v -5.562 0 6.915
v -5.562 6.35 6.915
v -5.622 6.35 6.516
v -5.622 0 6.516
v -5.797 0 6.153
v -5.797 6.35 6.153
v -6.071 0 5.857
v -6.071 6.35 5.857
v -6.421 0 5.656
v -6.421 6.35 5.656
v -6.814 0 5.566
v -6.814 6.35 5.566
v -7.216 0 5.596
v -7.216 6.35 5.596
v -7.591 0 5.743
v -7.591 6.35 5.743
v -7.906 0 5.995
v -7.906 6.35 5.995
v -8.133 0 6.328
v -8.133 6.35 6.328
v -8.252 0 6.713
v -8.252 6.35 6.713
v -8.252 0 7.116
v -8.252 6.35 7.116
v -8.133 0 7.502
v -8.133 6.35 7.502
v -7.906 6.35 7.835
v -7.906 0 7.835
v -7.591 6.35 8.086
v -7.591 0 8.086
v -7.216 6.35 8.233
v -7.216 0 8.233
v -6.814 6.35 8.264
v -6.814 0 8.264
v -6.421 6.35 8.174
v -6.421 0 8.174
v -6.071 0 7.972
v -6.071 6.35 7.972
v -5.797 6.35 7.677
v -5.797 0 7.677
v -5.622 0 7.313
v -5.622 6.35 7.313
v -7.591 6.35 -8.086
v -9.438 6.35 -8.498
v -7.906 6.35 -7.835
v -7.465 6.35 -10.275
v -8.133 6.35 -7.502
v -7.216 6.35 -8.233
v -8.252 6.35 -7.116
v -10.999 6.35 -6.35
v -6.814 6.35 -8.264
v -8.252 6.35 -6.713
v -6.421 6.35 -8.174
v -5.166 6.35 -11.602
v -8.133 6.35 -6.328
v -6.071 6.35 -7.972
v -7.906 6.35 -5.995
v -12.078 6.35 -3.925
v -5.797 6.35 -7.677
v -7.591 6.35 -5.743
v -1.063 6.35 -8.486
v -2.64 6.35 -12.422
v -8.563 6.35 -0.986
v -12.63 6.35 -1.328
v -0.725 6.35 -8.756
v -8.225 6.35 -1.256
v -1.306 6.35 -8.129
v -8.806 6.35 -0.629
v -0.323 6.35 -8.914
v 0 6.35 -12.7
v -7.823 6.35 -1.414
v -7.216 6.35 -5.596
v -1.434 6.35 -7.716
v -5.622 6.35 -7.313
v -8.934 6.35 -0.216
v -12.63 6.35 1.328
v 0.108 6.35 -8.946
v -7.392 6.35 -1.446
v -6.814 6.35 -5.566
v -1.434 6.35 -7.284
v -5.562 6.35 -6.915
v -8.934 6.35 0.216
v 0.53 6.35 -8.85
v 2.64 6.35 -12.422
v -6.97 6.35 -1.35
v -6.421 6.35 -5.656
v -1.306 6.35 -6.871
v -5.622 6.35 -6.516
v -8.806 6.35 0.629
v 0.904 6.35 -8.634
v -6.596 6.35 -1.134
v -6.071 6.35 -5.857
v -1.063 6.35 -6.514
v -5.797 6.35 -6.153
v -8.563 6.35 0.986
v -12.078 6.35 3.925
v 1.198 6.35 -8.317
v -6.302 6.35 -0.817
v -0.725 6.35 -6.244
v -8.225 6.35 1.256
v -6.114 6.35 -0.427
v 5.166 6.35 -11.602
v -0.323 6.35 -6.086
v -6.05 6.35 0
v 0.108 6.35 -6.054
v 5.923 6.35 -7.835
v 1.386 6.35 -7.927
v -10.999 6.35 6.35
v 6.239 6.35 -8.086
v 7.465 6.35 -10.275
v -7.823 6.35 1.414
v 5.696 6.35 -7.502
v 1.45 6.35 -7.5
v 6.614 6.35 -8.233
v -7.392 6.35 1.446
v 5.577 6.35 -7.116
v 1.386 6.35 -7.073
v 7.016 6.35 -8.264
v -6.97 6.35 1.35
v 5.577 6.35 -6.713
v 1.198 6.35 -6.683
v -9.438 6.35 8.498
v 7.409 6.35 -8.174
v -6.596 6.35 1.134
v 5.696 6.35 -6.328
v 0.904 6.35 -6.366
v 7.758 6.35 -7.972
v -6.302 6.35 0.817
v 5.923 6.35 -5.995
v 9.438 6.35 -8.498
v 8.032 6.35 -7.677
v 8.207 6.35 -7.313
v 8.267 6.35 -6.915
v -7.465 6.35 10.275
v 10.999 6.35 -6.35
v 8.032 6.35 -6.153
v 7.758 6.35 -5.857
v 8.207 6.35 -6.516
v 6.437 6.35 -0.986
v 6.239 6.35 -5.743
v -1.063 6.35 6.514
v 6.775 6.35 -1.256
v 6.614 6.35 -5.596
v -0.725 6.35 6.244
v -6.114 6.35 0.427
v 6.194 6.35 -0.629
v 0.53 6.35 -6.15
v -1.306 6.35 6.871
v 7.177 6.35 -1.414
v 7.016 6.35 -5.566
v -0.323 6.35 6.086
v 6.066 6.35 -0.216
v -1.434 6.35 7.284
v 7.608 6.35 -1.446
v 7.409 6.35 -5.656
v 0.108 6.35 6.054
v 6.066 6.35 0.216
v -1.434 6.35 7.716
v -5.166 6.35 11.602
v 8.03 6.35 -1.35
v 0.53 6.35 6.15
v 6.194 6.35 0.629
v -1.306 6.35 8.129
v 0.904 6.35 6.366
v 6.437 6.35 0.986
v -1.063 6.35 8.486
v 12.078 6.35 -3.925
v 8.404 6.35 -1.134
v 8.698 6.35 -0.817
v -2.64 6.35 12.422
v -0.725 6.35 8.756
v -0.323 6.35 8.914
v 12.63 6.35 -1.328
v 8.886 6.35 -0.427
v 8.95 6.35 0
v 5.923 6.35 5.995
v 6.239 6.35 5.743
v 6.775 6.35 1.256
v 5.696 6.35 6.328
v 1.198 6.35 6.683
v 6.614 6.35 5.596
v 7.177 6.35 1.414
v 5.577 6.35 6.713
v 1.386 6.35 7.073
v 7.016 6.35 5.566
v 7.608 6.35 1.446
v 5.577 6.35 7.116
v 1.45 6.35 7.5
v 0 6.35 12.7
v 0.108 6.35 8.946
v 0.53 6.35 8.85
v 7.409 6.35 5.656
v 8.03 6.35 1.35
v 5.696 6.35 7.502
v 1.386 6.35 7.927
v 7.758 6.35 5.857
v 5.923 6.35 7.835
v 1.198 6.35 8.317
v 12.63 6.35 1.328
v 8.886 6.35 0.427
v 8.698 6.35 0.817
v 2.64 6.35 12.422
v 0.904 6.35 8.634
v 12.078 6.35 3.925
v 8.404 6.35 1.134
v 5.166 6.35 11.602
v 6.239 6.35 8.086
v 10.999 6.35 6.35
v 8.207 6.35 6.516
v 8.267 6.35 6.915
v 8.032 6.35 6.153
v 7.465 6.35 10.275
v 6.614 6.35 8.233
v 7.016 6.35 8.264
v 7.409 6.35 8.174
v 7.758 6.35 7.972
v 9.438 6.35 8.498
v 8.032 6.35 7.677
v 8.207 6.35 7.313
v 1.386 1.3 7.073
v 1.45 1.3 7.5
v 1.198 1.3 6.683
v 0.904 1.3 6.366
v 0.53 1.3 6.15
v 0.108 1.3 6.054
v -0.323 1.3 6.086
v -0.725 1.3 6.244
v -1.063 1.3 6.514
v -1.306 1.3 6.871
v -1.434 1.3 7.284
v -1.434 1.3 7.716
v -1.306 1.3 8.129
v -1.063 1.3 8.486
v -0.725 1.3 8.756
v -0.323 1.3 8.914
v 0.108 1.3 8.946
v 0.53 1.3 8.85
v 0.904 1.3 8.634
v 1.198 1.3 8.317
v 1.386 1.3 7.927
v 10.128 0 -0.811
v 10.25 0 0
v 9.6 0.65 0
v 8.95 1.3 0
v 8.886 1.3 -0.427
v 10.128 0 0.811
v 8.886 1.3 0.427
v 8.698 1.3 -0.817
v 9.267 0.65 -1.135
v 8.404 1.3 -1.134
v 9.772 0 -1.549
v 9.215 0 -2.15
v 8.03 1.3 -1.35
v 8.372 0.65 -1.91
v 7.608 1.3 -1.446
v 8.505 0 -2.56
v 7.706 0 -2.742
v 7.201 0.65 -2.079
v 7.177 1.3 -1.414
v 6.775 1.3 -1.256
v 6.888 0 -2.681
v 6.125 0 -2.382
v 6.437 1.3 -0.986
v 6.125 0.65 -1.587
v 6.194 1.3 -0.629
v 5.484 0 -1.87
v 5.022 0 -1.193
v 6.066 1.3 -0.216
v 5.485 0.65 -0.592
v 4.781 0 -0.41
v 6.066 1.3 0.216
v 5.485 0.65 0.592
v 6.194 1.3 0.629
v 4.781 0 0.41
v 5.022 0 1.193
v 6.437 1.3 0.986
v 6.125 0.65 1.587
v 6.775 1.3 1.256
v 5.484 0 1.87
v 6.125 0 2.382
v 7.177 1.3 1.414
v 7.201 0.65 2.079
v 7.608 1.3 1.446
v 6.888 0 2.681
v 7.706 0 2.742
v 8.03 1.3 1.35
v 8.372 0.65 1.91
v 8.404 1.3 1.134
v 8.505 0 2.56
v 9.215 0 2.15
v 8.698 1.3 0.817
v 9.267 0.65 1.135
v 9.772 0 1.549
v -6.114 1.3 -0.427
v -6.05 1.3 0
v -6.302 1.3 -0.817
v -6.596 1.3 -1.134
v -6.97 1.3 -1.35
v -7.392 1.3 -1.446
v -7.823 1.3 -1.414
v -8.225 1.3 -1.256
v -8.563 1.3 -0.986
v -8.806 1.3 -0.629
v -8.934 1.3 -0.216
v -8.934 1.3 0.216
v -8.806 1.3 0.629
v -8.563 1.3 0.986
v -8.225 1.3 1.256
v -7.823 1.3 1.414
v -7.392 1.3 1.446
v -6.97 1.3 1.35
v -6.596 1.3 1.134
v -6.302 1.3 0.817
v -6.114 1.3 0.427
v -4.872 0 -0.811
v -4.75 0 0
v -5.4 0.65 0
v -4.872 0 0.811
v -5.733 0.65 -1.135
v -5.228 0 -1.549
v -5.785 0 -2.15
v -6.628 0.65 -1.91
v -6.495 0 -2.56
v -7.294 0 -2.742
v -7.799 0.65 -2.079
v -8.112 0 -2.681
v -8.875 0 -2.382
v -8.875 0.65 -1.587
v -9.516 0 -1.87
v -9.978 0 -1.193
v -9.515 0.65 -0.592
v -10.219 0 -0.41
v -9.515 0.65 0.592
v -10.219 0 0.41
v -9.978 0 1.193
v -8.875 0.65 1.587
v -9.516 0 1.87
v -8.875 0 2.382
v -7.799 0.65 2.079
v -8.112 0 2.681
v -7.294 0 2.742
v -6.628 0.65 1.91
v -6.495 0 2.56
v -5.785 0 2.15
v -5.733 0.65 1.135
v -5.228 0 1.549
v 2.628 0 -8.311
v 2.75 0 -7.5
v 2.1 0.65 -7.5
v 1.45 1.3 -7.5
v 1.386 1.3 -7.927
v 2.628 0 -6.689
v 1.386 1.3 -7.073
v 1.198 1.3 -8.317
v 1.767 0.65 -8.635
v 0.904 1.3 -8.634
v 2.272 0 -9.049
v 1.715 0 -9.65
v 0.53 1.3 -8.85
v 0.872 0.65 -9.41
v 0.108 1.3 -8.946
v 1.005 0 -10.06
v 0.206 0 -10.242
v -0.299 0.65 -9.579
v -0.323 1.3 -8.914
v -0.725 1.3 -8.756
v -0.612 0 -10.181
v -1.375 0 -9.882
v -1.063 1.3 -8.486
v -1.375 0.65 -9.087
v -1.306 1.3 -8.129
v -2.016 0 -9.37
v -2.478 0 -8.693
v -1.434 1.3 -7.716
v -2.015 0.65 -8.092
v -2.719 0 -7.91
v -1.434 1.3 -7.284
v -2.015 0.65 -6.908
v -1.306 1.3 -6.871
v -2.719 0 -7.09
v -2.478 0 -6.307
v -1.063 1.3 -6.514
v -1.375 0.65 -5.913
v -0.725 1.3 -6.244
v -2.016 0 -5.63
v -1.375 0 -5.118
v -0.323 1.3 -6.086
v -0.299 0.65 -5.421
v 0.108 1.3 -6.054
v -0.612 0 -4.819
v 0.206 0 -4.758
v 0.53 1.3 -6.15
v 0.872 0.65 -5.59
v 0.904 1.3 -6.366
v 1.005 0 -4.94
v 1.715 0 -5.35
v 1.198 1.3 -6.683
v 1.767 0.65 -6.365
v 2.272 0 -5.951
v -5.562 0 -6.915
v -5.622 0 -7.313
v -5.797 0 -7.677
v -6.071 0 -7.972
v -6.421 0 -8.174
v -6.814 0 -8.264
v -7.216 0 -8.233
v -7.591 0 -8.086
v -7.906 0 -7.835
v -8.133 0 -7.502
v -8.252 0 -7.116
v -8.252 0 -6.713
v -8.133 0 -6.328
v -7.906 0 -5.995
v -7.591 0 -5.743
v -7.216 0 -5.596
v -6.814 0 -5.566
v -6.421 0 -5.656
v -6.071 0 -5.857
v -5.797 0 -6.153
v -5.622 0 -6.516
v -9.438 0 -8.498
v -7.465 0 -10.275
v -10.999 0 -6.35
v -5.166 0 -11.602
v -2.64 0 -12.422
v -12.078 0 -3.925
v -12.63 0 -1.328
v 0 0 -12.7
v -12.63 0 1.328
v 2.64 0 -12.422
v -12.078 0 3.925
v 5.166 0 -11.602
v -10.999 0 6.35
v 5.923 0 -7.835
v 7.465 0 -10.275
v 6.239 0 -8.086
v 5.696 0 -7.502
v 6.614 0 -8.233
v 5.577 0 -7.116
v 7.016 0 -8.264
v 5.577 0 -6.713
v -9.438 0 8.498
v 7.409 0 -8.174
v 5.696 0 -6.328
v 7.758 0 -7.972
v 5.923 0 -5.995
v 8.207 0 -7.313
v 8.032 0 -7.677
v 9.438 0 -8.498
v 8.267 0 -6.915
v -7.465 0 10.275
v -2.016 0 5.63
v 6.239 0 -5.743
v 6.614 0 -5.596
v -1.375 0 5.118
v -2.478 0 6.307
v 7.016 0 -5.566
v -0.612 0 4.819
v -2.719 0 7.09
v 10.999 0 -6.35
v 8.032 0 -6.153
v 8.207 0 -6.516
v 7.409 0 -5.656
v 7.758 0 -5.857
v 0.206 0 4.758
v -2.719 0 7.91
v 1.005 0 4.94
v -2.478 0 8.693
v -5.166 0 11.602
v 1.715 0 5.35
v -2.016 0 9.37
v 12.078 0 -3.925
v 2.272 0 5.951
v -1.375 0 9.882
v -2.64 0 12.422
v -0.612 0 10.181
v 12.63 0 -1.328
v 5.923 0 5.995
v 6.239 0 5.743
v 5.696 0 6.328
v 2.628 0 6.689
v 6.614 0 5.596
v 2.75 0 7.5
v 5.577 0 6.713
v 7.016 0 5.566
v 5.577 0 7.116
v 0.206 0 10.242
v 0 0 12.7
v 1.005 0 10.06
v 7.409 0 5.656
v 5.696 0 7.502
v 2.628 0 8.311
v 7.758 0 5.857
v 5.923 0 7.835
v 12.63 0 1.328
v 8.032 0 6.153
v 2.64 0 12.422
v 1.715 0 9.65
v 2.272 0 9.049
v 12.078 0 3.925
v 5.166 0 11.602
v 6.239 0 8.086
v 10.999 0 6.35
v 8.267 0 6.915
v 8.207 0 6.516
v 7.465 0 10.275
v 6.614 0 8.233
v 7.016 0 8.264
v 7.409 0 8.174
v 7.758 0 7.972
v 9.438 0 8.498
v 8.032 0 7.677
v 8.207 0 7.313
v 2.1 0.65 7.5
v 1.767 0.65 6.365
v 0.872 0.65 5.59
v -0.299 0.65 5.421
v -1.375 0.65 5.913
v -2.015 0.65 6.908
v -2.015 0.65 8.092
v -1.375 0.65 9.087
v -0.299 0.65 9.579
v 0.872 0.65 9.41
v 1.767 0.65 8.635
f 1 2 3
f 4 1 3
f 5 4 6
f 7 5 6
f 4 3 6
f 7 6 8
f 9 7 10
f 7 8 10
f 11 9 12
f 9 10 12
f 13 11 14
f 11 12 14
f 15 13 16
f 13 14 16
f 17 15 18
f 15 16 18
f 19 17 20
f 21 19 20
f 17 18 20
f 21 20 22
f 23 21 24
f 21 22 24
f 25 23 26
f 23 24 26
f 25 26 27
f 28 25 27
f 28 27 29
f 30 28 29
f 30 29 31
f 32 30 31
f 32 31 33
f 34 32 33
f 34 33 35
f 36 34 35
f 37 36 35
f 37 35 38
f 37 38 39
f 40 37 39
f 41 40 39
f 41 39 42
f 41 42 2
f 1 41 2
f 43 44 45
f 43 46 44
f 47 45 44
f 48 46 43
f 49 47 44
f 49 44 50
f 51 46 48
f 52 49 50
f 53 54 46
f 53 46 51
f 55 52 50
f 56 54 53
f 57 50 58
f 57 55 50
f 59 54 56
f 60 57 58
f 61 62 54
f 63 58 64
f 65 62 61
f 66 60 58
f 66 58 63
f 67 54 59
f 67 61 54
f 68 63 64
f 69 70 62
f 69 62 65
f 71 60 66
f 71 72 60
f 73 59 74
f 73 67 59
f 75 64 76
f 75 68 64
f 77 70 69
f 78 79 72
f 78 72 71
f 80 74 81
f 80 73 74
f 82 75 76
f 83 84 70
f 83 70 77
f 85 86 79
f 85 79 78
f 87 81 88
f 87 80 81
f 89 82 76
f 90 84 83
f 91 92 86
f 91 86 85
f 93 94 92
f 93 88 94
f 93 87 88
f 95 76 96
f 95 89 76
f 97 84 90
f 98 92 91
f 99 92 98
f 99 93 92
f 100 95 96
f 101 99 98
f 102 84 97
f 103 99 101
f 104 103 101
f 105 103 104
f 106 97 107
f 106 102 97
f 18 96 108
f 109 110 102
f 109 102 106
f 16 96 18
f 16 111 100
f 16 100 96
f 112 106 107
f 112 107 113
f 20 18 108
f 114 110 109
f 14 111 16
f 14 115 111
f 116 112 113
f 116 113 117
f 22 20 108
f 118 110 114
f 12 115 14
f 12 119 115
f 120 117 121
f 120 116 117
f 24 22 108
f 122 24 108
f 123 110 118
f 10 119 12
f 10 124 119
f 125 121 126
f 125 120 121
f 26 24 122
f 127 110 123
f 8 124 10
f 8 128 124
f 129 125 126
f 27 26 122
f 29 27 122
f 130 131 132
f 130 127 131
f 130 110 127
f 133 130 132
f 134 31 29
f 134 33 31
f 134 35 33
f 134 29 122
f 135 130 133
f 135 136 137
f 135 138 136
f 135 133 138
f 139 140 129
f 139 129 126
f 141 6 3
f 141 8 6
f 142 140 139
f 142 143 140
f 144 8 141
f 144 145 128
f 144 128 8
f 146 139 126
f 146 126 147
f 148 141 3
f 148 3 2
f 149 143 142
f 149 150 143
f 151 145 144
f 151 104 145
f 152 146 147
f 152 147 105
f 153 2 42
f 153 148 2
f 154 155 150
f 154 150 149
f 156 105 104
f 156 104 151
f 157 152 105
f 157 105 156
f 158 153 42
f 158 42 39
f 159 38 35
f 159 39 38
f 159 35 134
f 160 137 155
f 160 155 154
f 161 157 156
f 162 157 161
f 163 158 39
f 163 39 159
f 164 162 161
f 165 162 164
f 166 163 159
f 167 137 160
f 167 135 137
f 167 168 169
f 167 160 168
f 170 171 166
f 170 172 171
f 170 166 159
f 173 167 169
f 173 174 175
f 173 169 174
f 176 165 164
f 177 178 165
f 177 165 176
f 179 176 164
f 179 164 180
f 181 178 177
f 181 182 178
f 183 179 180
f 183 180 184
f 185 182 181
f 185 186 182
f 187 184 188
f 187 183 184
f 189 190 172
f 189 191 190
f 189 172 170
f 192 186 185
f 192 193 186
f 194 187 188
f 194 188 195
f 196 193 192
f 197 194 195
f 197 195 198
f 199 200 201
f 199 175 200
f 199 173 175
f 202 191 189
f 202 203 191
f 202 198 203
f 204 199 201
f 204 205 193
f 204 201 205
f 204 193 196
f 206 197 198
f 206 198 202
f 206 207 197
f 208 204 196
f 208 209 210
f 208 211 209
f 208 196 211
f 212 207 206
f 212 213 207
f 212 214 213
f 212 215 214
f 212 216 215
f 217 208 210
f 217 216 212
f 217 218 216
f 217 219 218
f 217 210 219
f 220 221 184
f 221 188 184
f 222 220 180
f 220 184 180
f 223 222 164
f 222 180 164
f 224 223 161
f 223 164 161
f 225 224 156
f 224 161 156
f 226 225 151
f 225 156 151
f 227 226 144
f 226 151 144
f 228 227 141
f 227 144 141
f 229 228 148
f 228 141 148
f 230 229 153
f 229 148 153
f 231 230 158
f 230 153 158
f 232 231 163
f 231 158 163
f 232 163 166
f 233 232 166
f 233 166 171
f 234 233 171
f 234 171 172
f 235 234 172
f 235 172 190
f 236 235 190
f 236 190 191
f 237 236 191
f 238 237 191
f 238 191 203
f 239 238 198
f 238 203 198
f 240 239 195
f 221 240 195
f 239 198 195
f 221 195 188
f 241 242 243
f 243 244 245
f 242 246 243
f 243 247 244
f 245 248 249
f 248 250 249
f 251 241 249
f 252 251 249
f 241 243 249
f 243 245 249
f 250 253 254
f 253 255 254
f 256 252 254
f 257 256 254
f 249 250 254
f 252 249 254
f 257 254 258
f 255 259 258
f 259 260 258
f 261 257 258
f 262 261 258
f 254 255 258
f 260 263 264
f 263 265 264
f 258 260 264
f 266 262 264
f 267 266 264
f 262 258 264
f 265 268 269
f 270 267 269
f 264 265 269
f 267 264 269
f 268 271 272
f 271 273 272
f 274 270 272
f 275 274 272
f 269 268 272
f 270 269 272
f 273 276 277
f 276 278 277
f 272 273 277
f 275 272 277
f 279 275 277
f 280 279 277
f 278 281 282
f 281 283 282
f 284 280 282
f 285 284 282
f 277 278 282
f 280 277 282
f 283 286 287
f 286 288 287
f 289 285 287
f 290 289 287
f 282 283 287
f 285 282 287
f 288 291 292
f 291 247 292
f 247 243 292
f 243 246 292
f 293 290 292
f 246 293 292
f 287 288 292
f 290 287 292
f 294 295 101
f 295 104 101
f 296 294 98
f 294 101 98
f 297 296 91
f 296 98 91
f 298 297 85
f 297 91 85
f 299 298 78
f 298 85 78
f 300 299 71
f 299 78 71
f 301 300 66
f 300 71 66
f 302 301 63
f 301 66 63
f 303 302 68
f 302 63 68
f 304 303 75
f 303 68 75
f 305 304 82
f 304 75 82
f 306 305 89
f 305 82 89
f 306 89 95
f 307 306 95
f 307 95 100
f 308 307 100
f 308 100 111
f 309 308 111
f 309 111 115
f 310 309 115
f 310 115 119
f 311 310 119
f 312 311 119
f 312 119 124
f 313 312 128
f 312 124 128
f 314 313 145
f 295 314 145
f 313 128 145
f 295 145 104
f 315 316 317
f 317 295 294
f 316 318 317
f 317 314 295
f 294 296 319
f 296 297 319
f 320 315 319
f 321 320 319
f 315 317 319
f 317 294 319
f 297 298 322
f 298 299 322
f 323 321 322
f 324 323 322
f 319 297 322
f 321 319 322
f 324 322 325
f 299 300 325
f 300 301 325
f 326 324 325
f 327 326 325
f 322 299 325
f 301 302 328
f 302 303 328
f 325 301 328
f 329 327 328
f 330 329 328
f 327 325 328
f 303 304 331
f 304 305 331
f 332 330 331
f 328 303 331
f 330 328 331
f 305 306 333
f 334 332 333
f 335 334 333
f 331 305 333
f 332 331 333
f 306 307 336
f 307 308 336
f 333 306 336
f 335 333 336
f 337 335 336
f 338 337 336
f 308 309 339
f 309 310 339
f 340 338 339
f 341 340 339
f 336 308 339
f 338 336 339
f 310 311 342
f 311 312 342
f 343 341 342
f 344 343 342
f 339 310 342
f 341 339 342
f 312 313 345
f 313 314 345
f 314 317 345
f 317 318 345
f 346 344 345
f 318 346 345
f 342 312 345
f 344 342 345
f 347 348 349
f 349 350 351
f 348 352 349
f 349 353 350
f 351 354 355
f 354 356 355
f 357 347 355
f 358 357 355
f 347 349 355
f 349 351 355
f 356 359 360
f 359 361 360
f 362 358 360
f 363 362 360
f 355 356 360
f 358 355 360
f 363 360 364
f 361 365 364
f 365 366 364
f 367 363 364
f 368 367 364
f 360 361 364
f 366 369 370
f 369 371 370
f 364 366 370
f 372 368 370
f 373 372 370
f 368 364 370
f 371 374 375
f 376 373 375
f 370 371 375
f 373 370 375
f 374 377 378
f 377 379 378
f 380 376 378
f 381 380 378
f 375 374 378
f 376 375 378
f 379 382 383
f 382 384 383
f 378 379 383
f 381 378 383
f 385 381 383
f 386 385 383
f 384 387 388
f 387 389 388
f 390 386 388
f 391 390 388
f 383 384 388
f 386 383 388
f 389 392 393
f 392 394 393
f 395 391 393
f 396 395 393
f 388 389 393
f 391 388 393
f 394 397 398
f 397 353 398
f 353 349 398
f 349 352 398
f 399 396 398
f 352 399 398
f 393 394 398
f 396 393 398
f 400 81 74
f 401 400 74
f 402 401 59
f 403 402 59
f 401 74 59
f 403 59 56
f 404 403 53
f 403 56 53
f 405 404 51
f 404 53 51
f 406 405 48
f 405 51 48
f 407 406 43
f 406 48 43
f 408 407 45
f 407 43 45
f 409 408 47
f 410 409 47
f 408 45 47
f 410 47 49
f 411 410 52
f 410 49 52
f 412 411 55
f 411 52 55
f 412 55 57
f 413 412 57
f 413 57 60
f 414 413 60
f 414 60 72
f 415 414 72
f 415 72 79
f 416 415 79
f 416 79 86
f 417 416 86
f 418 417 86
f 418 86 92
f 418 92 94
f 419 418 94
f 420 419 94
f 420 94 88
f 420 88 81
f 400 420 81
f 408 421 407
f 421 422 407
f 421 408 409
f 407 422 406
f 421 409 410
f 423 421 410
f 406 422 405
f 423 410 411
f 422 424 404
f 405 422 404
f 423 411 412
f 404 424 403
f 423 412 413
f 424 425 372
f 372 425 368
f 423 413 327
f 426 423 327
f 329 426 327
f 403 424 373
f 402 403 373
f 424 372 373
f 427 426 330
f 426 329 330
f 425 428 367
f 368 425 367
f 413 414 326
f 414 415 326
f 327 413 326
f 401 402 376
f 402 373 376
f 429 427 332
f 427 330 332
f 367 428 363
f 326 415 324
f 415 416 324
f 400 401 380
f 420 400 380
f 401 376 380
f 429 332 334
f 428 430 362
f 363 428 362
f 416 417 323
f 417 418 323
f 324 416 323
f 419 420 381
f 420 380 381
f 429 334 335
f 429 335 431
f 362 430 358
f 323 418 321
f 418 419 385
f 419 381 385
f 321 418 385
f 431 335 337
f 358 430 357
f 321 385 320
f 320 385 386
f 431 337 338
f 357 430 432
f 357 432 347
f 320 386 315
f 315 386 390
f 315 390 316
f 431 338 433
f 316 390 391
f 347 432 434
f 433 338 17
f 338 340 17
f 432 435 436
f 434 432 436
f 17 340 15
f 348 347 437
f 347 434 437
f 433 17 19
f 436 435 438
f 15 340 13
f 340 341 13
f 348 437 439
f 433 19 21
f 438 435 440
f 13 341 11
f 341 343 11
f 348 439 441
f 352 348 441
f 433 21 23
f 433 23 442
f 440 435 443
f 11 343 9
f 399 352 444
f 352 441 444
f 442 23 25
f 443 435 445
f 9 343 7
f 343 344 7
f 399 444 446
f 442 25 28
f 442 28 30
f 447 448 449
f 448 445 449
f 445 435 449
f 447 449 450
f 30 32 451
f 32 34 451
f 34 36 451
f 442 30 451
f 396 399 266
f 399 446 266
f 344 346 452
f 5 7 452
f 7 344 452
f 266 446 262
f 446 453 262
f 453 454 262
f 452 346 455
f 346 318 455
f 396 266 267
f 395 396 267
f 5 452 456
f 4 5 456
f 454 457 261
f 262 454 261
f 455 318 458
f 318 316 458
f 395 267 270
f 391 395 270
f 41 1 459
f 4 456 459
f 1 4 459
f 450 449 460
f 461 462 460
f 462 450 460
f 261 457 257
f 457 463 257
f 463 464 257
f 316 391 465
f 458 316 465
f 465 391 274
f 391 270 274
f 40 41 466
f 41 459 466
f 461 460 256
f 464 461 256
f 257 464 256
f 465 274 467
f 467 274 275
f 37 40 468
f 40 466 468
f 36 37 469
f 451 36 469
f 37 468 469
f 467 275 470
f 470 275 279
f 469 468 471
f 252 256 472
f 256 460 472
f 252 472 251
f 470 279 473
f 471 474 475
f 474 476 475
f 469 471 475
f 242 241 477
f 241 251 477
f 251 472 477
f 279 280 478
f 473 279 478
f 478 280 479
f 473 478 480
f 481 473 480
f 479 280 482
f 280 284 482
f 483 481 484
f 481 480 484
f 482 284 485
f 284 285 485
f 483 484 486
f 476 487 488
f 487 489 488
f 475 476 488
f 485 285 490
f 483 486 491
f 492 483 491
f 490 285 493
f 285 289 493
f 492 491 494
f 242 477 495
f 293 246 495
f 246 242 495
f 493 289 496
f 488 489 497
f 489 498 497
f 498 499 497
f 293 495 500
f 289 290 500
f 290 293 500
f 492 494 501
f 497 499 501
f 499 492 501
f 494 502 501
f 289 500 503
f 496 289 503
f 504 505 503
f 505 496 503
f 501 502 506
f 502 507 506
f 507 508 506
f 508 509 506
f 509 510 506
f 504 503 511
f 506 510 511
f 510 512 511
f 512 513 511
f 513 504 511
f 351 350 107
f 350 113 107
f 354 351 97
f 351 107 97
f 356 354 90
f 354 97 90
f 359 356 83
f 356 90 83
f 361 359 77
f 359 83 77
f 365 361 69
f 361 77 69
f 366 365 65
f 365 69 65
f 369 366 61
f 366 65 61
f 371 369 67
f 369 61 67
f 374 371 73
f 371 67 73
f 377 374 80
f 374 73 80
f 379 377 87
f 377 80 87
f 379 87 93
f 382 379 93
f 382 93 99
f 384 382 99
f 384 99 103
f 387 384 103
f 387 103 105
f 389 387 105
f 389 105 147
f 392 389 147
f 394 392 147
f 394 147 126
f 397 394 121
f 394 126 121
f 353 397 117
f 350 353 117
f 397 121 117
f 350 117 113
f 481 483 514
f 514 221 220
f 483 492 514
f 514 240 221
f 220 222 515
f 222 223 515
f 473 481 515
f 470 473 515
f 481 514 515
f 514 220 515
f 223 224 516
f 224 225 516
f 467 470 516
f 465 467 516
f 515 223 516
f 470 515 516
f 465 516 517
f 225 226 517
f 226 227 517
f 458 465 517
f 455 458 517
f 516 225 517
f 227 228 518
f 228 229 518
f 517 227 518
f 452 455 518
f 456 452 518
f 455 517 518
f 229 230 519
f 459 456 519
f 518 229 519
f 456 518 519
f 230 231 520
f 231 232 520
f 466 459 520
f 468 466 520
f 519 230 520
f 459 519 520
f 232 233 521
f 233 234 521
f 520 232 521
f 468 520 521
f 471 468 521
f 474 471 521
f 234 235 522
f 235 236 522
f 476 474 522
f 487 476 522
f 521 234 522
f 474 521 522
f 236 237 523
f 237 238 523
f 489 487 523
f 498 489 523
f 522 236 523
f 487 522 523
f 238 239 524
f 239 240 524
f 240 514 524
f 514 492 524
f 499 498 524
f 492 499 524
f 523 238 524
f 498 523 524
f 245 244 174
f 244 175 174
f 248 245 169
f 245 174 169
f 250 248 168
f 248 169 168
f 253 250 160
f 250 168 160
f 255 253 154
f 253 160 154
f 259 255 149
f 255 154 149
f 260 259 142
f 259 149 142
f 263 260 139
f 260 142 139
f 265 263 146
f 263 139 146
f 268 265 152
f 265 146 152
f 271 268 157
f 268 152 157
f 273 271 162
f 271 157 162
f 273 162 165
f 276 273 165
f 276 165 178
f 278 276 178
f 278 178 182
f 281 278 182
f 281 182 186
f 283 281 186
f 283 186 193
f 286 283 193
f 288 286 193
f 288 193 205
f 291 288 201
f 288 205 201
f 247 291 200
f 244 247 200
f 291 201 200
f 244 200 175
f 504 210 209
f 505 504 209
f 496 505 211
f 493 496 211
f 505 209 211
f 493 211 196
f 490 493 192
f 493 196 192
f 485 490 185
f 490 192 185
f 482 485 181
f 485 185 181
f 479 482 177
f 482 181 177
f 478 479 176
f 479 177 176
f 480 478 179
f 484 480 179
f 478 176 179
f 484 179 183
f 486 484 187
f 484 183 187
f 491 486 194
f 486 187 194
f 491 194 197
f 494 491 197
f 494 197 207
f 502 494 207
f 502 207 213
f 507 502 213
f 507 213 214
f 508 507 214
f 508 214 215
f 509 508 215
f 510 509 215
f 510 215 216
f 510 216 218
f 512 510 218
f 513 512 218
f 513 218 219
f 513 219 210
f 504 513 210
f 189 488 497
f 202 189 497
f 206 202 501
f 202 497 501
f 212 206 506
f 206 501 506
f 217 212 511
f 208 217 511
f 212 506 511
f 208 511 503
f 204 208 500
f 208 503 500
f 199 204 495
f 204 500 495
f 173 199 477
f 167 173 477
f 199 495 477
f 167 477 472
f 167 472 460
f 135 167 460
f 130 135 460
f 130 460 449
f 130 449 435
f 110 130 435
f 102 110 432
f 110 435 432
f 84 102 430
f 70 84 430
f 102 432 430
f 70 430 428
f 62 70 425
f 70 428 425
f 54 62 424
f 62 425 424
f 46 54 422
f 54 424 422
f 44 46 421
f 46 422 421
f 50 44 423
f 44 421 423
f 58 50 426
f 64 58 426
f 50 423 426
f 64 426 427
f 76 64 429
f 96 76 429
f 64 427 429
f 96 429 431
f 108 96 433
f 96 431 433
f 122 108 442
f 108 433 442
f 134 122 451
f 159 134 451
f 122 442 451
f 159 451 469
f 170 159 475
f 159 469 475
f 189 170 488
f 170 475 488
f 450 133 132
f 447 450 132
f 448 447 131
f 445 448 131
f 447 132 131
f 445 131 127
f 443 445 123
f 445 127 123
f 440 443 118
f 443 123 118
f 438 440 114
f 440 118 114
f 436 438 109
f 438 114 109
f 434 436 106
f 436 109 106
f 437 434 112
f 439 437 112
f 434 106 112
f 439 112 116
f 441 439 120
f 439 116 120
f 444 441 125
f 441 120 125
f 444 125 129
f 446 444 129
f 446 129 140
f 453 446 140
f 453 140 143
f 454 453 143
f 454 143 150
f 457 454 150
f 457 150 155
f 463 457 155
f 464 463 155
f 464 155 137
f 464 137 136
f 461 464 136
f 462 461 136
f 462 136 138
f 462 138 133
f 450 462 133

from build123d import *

# Parameters (mm, degrees)
SKETCH2_R                                         = 12.7
BOSS_EXTRUDE1_DEPTH                               = 6.35
CSK_FOR_M2_5_FLAT_HEAD_MACHINE_SCREW1_D           = 2.9
CSK_FOR_M2_5_FLAT_HEAD_MACHINE_SCREW1_CSINK_D     = 5.5
CSK_FOR_M2_5_FLAT_HEAD_MACHINE_SCREW1_CSINK_ANGLE = 90
F_6_32_TAPPED_HOLE1_D                             = 2.7051
F_6_32_TAPPED_HOLE1_DEPTH                         = 9.38784
F_6_32_TAPPED_HOLE1_TIP                           = 0.81269403


with BuildPart() as part:
    # Sketch2 → Boss-Extrude1 (new body)
    with BuildSketch(Plane(origin=(0, 0, 0), x_dir=(1, 0, 0), z_dir=(0, 1, 0))):
        with Locations(Location((0, 0, 0), (0, 0, 270))):
            Circle(SKETCH2_R)
    extrude(amount=BOSS_EXTRUDE1_DEPTH)

    # CSK for M2.5 Flat Head Machine Screw1 (through all)
    with Locations(Plane(origin=(0, 0, 0), x_dir=(-1, 0, 0), z_dir=(0, -1, 0))):
        with Locations((7.5, 0), (-7.5, 0), (0, -7.5), (0, 7.5)):
            CounterSinkHole(CSK_FOR_M2_5_FLAT_HEAD_MACHINE_SCREW1_D / 2, CSK_FOR_M2_5_FLAT_HEAD_MACHINE_SCREW1_CSINK_D / 2, counter_sink_angle=CSK_FOR_M2_5_FLAT_HEAD_MACHINE_SCREW1_CSINK_ANGLE)

    # #6-32 Tapped Hole1
    with Locations(Plane(origin=(0, 0, 0), x_dir=(-1, 0, 0), z_dir=(0, -1, 0))):
        with Locations((6.914797213, -6.914797213), (-6.914797213, -6.914797213), (-6.914797213, 6.914797213), (6.914797213, 6.914797213)):
            Hole(F_6_32_TAPPED_HOLE1_D / 2, depth=F_6_32_TAPPED_HOLE1_DEPTH)
            with Locations((0, 0, -(F_6_32_TAPPED_HOLE1_DEPTH + F_6_32_TAPPED_HOLE1_TIP / 2))):  # 118° drill point
                Cone(0, F_6_32_TAPPED_HOLE1_D / 2, F_6_32_TAPPED_HOLE1_TIP, mode=Mode.SUBTRACT)


solid = part.part
